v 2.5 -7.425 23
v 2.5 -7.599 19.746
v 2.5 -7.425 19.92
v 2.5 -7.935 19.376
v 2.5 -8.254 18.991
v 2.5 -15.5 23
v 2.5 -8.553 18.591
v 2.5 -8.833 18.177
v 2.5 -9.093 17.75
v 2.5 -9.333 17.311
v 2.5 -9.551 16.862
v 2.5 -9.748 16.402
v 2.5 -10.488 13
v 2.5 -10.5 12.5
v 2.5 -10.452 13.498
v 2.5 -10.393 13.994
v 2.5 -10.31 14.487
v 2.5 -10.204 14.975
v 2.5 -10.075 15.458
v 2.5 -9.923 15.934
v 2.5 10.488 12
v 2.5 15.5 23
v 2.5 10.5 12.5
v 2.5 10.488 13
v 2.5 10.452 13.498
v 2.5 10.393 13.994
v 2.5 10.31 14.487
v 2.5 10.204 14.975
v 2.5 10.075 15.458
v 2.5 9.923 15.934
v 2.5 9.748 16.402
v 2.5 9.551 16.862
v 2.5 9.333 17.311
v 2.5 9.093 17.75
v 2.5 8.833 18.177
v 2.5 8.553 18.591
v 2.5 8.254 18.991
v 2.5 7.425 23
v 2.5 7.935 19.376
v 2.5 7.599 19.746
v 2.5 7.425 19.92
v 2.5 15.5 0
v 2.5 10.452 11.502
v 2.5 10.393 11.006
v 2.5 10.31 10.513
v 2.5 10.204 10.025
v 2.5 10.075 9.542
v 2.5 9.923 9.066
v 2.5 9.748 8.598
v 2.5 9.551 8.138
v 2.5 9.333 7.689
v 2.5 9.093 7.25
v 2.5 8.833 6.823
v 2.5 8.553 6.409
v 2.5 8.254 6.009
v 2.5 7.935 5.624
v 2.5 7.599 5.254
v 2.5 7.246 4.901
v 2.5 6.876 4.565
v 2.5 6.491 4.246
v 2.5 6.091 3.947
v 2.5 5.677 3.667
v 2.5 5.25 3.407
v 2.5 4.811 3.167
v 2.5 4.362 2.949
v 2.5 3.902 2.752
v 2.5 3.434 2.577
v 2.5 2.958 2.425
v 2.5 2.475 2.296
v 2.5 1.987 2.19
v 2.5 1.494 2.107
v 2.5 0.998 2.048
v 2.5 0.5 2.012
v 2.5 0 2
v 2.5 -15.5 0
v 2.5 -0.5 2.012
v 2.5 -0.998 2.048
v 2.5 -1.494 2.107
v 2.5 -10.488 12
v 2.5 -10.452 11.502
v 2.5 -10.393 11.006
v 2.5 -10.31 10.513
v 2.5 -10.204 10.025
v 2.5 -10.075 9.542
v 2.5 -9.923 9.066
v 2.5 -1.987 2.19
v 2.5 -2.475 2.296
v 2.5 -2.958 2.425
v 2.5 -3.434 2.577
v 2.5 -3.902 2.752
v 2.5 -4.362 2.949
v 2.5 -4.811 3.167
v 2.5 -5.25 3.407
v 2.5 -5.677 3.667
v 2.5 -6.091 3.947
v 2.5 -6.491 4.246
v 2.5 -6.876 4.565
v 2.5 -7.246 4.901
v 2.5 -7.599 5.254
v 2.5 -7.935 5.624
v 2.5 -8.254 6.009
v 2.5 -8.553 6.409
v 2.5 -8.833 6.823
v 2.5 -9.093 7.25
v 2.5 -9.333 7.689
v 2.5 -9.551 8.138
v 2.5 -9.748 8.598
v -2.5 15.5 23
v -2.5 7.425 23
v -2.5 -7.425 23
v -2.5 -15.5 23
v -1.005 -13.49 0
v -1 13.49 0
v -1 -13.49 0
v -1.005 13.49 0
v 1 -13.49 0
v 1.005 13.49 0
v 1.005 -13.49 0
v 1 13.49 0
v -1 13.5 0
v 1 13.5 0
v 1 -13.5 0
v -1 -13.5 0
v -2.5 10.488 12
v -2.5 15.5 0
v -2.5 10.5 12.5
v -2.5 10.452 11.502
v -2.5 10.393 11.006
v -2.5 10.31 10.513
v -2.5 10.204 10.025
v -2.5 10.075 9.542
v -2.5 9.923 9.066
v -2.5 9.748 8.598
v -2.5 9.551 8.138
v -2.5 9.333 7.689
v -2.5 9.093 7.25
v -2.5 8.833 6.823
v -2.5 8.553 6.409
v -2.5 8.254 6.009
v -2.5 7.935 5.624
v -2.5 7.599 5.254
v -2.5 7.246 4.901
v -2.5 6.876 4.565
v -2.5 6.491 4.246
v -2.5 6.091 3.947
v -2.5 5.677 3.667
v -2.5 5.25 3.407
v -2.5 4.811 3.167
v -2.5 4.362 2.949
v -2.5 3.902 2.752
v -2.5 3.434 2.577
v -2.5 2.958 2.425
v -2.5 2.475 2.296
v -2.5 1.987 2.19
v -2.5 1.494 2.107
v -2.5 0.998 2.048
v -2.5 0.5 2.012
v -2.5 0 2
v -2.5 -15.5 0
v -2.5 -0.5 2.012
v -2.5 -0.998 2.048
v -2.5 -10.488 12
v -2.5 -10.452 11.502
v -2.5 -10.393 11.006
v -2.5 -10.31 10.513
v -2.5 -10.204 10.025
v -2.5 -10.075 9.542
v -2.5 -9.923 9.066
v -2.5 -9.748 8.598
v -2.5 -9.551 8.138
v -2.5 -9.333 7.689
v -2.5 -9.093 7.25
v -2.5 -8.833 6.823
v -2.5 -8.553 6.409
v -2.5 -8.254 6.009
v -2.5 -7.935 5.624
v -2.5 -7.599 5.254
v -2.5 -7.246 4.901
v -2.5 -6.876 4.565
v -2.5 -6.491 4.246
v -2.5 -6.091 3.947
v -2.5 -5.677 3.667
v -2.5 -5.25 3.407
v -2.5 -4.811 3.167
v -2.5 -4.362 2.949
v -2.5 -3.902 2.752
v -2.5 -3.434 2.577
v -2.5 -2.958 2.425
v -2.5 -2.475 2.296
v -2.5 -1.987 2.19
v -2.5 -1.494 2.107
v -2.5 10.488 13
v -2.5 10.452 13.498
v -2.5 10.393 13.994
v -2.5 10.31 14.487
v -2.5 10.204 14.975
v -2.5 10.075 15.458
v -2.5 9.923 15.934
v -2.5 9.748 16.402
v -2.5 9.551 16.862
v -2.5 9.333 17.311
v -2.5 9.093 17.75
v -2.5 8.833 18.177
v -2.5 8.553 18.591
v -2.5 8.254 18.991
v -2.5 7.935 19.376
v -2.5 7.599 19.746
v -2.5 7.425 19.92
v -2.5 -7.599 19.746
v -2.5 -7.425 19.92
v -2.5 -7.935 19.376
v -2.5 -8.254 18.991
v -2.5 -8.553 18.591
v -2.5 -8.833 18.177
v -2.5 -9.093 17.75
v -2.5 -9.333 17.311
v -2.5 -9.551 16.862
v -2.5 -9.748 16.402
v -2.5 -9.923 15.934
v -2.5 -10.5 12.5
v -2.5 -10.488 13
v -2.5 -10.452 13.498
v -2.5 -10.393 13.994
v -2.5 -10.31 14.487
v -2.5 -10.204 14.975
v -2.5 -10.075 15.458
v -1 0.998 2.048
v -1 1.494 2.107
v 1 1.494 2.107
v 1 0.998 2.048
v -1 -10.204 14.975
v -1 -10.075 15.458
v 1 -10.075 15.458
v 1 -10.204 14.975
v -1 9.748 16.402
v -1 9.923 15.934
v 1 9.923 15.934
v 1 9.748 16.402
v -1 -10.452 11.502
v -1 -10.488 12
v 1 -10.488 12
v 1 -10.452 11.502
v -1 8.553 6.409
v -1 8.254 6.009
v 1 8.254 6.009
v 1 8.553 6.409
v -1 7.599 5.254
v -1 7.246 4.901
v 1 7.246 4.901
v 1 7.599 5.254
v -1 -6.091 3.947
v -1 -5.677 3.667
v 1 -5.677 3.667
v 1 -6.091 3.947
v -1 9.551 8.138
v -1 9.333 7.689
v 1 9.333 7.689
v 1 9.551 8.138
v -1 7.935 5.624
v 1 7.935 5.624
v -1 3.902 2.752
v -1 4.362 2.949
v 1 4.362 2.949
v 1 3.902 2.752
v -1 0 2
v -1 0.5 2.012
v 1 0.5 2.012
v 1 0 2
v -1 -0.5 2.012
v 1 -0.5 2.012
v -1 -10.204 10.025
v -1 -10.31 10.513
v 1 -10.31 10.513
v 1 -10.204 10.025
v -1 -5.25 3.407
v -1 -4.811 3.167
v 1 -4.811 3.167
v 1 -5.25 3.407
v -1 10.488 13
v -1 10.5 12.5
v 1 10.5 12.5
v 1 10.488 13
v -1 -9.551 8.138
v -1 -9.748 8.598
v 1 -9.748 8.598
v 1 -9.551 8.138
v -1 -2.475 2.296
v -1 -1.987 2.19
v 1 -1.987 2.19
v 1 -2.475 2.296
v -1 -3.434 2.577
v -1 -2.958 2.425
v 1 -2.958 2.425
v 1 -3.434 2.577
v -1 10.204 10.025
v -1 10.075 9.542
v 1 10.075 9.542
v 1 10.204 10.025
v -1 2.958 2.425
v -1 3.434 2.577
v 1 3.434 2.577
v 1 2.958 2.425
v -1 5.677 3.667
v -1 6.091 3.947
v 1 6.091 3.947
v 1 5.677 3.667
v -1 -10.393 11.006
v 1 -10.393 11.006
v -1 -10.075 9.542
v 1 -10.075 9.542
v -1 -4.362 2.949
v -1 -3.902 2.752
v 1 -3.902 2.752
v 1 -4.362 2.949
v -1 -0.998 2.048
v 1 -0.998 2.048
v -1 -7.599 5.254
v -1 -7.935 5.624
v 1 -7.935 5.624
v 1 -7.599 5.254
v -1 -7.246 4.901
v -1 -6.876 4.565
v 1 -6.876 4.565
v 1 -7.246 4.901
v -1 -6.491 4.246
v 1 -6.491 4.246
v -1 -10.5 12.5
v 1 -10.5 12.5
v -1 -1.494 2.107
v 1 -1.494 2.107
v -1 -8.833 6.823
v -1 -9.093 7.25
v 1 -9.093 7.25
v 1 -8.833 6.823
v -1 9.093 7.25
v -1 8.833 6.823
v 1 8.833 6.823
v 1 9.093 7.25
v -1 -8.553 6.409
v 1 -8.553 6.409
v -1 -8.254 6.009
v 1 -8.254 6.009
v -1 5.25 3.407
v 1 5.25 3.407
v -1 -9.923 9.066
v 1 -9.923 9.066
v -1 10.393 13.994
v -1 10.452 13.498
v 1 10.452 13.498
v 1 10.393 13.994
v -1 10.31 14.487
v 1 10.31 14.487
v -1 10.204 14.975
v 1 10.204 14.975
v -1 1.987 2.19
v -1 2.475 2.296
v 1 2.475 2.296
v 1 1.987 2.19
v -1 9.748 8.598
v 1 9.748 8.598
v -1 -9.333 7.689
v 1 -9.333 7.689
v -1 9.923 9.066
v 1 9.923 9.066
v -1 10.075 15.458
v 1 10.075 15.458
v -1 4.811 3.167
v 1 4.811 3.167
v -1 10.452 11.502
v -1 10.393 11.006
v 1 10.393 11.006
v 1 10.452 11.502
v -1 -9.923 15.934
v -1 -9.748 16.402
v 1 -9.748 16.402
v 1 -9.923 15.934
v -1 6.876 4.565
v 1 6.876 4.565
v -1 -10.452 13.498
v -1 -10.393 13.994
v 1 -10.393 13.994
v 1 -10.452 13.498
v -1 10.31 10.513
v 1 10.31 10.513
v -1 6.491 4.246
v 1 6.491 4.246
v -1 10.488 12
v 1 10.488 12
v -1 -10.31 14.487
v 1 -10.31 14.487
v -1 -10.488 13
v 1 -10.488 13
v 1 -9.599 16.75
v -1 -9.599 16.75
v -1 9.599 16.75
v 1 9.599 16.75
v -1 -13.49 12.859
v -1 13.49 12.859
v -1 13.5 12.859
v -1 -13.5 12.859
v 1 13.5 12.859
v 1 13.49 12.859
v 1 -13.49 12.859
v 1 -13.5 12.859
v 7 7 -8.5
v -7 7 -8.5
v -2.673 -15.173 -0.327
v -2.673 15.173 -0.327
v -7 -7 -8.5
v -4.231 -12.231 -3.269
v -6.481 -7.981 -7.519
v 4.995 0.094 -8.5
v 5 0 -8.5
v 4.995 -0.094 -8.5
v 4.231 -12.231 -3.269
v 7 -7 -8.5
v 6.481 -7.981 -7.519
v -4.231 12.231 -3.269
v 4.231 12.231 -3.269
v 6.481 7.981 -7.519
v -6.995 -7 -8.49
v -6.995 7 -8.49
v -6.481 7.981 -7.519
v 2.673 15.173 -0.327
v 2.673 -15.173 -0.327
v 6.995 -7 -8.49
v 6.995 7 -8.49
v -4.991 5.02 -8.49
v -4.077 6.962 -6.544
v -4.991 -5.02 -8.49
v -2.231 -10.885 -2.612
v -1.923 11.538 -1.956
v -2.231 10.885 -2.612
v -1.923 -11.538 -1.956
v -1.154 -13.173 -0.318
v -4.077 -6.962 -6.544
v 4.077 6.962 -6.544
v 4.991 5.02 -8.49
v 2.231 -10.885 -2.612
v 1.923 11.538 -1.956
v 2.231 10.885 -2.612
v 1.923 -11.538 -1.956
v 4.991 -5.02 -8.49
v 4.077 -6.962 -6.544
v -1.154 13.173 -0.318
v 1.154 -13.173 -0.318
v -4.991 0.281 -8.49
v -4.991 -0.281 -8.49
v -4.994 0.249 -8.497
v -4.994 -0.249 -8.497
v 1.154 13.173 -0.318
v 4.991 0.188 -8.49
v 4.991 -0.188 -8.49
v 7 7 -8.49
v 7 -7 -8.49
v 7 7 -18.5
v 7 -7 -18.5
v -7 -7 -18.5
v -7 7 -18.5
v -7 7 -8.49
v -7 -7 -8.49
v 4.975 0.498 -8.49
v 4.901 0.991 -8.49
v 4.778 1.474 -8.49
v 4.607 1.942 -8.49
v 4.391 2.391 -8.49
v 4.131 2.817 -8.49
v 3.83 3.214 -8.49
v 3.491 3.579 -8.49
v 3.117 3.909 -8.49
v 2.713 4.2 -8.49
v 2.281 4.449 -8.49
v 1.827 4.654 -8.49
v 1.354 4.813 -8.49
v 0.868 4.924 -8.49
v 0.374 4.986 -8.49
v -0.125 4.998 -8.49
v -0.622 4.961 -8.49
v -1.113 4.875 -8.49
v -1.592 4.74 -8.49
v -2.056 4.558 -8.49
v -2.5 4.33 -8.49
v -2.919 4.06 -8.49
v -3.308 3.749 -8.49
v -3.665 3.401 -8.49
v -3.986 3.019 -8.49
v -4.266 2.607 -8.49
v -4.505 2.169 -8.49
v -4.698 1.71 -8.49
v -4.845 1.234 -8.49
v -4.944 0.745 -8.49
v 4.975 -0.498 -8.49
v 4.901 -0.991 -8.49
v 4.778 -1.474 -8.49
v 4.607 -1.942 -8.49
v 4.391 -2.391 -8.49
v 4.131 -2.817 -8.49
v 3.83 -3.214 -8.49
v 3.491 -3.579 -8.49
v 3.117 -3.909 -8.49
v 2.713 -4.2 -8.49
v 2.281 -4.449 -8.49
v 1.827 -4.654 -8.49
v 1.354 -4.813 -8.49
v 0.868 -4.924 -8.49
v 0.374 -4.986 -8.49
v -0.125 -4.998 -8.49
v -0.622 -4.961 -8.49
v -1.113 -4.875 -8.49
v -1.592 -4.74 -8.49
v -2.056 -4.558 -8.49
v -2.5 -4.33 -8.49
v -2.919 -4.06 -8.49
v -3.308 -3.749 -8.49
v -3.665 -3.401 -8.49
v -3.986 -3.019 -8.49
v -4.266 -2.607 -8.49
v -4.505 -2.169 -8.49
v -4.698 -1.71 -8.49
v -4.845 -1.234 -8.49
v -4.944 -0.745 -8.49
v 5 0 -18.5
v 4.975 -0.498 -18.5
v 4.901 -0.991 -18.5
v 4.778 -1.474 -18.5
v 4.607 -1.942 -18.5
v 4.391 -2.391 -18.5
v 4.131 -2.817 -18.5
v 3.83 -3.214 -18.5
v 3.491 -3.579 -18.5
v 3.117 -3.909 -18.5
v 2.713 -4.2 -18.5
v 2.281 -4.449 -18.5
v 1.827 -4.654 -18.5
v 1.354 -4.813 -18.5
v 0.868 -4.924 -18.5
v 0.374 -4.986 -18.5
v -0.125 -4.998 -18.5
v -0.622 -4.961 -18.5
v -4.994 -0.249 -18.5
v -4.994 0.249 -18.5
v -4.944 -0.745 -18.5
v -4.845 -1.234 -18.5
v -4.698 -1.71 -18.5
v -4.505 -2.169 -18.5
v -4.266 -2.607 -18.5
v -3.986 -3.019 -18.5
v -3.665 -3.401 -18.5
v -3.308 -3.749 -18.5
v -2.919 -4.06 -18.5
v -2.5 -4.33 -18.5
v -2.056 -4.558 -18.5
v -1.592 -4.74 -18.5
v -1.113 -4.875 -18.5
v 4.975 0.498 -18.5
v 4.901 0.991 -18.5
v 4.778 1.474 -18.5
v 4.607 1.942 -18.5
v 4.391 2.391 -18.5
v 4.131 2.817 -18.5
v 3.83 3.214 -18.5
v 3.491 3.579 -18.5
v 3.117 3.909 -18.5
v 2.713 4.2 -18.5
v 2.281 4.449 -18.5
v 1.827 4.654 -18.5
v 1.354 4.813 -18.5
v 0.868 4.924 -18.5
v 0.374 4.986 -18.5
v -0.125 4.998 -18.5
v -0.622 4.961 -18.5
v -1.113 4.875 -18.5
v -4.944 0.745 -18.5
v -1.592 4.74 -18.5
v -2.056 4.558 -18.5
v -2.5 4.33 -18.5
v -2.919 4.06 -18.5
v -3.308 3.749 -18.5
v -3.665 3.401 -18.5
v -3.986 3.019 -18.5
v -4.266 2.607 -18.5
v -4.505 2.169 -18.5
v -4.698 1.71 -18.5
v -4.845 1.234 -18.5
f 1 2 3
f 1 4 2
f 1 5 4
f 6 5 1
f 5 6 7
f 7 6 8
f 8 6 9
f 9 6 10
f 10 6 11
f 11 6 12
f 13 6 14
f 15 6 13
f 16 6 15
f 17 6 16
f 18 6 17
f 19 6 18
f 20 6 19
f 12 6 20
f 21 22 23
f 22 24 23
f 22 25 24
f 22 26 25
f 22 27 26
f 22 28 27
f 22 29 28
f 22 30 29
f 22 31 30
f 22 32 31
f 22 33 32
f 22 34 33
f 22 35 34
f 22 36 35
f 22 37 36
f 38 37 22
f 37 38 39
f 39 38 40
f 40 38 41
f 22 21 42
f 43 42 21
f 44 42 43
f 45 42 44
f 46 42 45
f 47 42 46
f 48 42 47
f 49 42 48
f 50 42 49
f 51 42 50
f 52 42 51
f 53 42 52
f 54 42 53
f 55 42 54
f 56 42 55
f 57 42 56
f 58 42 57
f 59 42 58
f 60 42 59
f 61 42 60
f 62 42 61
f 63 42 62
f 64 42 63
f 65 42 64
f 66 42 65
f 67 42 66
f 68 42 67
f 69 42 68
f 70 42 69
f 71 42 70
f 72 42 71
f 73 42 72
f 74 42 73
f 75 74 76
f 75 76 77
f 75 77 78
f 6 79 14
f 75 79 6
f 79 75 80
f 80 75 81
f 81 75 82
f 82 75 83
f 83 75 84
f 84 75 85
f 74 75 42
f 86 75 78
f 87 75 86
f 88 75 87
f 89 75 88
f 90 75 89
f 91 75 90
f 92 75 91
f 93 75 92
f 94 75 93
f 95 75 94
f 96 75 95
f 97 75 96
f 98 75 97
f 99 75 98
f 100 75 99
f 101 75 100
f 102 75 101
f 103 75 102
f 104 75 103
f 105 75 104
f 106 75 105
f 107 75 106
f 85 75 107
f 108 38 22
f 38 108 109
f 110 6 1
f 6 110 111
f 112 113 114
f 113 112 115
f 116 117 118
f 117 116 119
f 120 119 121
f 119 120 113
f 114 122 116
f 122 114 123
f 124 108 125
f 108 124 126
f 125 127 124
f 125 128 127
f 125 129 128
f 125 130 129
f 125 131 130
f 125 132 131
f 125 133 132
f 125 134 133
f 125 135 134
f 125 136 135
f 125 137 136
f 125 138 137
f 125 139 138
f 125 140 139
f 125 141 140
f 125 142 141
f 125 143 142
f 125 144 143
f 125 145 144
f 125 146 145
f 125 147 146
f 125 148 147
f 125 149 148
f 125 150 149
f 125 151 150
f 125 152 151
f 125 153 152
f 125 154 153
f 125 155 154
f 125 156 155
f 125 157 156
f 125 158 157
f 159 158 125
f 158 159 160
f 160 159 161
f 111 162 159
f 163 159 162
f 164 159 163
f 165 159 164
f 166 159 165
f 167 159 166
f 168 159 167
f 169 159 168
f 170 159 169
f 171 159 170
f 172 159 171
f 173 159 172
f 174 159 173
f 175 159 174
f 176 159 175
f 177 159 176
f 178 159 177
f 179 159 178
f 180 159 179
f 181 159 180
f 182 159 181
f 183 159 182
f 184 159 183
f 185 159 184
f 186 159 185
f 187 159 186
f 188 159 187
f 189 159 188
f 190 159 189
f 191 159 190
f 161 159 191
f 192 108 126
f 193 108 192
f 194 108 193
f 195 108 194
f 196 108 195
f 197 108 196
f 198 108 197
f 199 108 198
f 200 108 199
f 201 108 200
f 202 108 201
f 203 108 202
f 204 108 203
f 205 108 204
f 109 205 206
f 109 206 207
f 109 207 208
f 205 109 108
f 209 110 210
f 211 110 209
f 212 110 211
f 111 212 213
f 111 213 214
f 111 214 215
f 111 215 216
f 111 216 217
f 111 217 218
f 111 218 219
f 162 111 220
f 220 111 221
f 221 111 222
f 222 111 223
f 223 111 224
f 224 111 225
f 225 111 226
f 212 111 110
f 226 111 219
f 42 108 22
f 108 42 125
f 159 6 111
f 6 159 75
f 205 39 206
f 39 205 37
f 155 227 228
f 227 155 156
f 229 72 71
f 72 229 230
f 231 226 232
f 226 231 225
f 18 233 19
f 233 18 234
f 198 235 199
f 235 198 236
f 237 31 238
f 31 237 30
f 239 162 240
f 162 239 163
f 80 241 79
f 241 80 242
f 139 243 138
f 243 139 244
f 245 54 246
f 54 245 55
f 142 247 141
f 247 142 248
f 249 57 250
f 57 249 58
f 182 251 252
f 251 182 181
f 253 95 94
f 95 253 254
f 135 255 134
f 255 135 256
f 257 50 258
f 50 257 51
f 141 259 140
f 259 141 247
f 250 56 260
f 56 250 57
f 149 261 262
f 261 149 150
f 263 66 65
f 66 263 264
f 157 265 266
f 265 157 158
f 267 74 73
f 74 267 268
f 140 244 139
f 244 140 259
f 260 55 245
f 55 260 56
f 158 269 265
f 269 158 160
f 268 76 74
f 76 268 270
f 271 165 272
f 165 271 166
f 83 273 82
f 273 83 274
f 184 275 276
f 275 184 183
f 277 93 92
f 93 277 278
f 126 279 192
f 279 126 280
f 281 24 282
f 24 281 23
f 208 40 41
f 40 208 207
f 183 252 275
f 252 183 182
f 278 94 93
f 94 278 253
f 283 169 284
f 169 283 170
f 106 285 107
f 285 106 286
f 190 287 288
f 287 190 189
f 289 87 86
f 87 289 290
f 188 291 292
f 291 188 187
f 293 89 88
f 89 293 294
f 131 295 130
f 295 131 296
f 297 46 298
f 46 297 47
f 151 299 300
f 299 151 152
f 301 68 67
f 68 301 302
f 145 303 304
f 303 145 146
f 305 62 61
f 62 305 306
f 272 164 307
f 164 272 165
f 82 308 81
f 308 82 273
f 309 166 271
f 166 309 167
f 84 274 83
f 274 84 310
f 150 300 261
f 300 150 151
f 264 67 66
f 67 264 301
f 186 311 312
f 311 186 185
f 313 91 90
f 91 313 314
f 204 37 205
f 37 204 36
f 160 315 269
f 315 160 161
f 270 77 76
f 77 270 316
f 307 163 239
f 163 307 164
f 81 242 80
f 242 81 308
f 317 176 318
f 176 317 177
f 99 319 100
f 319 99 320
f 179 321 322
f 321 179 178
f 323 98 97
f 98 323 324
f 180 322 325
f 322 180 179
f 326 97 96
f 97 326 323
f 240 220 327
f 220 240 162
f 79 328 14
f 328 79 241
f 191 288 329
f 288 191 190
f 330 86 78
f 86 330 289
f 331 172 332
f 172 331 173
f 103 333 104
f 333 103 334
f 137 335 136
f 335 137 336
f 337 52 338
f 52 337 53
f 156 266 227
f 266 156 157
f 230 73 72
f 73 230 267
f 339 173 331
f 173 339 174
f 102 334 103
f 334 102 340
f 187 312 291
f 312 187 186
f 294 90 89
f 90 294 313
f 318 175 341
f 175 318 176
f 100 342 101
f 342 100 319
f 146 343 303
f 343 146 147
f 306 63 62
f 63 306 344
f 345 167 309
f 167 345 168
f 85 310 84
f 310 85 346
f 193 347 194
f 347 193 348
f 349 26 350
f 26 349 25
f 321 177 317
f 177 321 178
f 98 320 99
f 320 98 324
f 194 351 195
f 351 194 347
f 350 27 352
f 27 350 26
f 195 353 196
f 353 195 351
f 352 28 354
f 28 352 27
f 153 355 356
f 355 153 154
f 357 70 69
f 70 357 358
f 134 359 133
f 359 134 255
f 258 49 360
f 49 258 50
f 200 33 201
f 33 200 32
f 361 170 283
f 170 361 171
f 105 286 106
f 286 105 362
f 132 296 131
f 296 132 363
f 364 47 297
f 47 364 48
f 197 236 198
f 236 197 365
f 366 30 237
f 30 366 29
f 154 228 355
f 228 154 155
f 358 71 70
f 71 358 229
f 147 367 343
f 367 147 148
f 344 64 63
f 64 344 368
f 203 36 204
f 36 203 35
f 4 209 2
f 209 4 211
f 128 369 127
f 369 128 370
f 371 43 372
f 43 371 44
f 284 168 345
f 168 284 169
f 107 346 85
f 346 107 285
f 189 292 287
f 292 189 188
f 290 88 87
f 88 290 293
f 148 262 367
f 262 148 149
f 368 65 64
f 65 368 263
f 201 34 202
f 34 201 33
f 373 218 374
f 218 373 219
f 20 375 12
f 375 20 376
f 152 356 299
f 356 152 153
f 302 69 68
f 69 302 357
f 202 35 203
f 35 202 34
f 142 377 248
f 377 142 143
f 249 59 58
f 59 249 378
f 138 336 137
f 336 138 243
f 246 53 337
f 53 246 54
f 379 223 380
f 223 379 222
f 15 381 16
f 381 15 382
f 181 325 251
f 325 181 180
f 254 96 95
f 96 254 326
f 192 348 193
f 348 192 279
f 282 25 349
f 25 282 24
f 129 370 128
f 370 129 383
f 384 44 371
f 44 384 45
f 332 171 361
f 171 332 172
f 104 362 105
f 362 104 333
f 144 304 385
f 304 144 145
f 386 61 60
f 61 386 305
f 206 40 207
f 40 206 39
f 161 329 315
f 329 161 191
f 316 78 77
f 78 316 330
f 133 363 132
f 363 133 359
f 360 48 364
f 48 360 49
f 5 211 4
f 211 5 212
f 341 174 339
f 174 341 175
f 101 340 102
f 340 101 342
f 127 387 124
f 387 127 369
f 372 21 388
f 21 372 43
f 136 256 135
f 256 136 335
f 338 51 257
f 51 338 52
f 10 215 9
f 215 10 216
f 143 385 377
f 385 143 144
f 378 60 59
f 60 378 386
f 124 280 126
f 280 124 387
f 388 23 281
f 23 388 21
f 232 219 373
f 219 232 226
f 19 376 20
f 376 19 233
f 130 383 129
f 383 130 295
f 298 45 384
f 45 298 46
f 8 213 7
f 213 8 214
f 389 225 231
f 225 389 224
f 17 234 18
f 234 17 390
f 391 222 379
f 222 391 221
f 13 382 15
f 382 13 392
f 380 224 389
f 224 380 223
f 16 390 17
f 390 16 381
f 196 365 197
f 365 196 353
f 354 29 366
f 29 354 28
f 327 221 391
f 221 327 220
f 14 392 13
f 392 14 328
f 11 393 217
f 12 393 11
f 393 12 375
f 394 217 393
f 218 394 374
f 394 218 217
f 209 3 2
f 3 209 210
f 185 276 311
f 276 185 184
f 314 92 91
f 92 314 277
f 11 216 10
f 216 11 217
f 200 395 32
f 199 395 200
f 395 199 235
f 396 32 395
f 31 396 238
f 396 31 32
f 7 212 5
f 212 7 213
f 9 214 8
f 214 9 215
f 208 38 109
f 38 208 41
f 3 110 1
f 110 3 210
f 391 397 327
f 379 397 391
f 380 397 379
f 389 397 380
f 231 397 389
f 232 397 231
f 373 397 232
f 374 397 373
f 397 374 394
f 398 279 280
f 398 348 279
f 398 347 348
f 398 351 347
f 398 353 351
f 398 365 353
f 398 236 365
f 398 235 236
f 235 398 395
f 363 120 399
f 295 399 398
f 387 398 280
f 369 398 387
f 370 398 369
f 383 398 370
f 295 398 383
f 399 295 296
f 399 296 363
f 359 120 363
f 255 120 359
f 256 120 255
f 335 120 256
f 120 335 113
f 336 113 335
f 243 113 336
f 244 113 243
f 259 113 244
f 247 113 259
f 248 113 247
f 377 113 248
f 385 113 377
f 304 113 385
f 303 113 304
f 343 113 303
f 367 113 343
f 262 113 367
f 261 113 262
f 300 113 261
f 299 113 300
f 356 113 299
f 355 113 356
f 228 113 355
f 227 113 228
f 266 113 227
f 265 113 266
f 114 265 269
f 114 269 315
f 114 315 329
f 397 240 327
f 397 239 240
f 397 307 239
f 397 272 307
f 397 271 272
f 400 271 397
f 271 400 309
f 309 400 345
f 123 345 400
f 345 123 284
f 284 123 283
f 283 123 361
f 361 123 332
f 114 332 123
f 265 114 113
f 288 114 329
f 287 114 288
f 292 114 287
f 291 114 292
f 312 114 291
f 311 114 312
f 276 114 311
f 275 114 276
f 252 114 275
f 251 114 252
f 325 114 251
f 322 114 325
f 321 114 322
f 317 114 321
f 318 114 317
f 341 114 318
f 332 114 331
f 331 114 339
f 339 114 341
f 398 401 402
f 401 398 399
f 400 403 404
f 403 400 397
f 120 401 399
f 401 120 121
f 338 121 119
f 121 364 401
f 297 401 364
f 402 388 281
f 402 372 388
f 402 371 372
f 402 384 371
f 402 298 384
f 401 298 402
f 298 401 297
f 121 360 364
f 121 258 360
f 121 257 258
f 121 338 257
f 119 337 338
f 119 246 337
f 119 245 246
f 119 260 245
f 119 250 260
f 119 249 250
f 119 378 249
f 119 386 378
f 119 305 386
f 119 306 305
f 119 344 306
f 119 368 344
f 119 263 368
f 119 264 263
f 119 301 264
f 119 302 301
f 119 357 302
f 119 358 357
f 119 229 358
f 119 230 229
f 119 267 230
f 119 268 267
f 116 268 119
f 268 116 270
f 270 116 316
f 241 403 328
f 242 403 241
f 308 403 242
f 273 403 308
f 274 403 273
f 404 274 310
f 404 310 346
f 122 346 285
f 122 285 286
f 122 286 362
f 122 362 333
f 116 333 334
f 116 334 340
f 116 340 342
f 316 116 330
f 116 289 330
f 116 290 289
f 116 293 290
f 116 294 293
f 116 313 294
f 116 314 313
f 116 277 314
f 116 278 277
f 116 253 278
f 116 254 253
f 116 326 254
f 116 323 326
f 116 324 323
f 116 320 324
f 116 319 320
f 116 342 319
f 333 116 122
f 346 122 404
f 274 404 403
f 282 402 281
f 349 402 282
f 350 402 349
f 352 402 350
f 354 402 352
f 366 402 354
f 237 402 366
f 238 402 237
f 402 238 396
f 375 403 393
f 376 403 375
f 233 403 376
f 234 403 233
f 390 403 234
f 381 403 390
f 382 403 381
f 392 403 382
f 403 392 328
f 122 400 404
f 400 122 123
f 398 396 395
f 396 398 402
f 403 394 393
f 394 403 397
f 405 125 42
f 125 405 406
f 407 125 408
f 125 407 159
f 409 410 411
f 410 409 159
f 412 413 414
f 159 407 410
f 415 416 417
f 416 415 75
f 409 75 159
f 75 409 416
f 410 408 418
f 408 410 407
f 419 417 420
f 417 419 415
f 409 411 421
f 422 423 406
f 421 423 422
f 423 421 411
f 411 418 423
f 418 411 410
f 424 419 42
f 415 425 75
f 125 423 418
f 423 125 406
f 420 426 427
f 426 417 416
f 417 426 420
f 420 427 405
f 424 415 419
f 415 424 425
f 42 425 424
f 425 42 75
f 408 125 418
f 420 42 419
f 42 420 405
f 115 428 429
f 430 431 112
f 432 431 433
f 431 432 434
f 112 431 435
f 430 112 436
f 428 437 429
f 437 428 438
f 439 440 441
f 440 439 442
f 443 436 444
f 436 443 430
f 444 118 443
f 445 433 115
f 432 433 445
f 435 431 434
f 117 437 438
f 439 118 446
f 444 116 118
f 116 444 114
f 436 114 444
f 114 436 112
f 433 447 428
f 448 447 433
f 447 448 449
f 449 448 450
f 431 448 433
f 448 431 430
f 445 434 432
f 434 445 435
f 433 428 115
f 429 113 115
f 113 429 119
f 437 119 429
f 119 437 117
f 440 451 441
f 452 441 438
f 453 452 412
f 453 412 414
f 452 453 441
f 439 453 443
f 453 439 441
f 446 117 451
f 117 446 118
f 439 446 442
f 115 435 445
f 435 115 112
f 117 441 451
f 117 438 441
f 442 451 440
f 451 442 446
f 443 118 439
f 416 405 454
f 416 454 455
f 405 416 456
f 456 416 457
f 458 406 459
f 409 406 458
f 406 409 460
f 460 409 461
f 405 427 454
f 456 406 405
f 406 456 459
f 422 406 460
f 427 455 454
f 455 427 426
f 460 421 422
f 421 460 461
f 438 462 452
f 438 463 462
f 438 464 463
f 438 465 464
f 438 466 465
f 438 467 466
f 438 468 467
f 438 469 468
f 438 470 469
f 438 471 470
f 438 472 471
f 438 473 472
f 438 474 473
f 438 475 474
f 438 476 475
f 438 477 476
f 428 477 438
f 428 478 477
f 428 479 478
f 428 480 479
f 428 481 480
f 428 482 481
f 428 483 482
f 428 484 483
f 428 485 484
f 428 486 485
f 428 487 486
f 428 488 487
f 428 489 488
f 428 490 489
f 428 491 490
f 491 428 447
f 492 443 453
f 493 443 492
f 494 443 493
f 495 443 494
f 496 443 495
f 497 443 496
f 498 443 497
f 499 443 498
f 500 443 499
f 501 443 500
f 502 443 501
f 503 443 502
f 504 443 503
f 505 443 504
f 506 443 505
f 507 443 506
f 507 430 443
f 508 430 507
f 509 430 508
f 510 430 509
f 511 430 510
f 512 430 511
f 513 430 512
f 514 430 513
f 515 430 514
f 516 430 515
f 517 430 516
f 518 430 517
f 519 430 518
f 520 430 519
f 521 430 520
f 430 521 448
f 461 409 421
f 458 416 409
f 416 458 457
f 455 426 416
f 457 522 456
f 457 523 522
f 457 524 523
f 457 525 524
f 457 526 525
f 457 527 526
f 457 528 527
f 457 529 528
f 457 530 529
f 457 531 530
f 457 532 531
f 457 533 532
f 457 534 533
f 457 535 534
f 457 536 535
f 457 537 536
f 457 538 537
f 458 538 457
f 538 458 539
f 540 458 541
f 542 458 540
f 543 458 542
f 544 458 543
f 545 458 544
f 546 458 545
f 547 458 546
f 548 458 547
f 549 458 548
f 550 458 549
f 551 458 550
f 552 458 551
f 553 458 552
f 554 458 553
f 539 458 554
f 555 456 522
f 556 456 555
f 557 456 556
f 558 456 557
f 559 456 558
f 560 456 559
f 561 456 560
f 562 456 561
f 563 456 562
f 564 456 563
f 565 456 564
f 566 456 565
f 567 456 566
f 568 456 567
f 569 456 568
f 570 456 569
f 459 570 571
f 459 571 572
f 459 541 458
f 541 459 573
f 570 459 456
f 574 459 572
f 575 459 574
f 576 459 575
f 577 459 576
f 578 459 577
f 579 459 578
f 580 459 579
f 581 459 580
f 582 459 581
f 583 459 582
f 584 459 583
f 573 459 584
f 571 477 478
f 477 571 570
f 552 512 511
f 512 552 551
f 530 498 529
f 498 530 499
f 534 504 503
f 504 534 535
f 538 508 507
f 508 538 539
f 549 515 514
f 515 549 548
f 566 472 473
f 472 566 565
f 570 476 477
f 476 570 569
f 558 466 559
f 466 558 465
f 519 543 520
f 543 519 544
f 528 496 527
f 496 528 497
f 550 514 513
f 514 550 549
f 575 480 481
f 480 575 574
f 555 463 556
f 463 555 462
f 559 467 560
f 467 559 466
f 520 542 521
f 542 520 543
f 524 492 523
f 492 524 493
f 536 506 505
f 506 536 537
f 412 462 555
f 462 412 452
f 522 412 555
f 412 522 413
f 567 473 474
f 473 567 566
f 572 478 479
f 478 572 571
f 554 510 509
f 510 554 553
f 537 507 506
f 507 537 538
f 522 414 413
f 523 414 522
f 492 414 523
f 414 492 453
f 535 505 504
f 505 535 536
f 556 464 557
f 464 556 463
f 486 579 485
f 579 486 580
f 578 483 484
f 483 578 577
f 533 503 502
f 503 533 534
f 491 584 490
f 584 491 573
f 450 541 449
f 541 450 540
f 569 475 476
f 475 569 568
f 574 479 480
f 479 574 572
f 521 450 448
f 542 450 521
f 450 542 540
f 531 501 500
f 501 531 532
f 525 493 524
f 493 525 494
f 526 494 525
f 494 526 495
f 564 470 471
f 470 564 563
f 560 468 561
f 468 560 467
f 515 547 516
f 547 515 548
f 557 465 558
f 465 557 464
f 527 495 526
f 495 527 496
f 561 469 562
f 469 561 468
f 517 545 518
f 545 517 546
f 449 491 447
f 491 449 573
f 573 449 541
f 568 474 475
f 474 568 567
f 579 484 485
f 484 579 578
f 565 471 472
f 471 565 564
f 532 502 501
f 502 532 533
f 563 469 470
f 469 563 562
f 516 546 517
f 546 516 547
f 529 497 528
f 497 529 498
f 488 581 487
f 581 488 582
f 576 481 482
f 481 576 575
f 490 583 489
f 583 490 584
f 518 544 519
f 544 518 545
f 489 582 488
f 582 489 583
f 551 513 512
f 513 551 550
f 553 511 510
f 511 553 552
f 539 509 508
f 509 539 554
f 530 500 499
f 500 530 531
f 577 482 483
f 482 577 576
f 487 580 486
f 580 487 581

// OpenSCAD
$fs=1/2;
$fa=1/2;
bissl=1/100;
vape_diameter=21;
vd=vape_diameter; //diameter of part where vents are
vent_width=2;
ih=vent_width; //height of vent inside collar
collar_height=5;
oh=collar_height; //height of part where vents are
mouthpiece_hole=10;
td=mouthpiece_hole; //mouthpiece width
vertical_wall=2;
w=vertical_wall; //wall around mouthpiece and around collar, other walls are thinner
air_channel=3;
v=air_channel; //vent depth
shift=1;
s=shift; //shift of vent geometry, defines seal width
mouthpiece_length=10;
ms=mouthpiece_length; //mouthpiece length
rounded_mouthpiece=false;
tightening_screw=false; //produce geometry for a tightening screw, rely on tight fit if false
tightening_screw_d=2;
hole=tightening_screw_d;
sq=sqrt(2)/2;
difference() {
  translate([-oh/2,-vd/2-v-w,0])cube([oh,vd+2*v+2*w,vd+w+(tightening_screw?(2*w+hole):0)]);
  translate([0,0,vd/2+w])rotate([0,90,0]) cylinder(h=oh+bissl,d=vd,center=true);
  translate([-oh/2-bissl,-vd*sq/2,w+vd/2]) cube([oh+2*bissl,vd*sq,vd/2+2*w+hole+bissl]);
  translate([0,0,2*w+vd])rotate([90,0,0])cylinder(d=hole,h=vd+2*v+2*w+bissl,center=true);
  translate([0,0,-bissl])linear_extrude(height=w+vd/2+vd*sq-v-vd/2-s+2*bissl, scale=[1,1]) square([ih,vd+2*v],center=true);
  translate([0,0,w+vd/2+vd*sq-v-vd/2-s])linear_extrude(height=vd/2+v, scale=[1,0]) square([ih,vd+2*v],center=true);
}
h=-((td+2*w)-(vd+2*v+2*w))/2;
mirror([0,0,1]) difference() {
  linear_extrude(height=h,scale=[(td+2*w)/oh,(td+2*w)/(vd+2*v+2*w)]) square([oh,vd+2*v+2*w],center=true);
  translate([0,0,-bissl])linear_extrude(height=h+2*bissl,scale=[td/ih,td/(vd+2*v)]) square([ih,vd+2*v],center=true);
  }
//outer: oh->td+2*w vd+2*v+2*w->td+2*w
//inner: ih->td vd+2*v->td
translate([0,0,-h-ms]) difference() {
  hull() {
    cylinder(h=ms,d=td+2*w);
    if(!rounded_mouthpiece) translate([-td/2-w,-td/2-w,0])cube([td+2*w,td+2*w,ms]);
    translate([-td/2-w,-td/2-w,ms])cube([td+2*w,td+2*w,bissl]);

  }
  translate([0,0,-bissl])cylinder(h=ms+3*bissl,d=td);
}
